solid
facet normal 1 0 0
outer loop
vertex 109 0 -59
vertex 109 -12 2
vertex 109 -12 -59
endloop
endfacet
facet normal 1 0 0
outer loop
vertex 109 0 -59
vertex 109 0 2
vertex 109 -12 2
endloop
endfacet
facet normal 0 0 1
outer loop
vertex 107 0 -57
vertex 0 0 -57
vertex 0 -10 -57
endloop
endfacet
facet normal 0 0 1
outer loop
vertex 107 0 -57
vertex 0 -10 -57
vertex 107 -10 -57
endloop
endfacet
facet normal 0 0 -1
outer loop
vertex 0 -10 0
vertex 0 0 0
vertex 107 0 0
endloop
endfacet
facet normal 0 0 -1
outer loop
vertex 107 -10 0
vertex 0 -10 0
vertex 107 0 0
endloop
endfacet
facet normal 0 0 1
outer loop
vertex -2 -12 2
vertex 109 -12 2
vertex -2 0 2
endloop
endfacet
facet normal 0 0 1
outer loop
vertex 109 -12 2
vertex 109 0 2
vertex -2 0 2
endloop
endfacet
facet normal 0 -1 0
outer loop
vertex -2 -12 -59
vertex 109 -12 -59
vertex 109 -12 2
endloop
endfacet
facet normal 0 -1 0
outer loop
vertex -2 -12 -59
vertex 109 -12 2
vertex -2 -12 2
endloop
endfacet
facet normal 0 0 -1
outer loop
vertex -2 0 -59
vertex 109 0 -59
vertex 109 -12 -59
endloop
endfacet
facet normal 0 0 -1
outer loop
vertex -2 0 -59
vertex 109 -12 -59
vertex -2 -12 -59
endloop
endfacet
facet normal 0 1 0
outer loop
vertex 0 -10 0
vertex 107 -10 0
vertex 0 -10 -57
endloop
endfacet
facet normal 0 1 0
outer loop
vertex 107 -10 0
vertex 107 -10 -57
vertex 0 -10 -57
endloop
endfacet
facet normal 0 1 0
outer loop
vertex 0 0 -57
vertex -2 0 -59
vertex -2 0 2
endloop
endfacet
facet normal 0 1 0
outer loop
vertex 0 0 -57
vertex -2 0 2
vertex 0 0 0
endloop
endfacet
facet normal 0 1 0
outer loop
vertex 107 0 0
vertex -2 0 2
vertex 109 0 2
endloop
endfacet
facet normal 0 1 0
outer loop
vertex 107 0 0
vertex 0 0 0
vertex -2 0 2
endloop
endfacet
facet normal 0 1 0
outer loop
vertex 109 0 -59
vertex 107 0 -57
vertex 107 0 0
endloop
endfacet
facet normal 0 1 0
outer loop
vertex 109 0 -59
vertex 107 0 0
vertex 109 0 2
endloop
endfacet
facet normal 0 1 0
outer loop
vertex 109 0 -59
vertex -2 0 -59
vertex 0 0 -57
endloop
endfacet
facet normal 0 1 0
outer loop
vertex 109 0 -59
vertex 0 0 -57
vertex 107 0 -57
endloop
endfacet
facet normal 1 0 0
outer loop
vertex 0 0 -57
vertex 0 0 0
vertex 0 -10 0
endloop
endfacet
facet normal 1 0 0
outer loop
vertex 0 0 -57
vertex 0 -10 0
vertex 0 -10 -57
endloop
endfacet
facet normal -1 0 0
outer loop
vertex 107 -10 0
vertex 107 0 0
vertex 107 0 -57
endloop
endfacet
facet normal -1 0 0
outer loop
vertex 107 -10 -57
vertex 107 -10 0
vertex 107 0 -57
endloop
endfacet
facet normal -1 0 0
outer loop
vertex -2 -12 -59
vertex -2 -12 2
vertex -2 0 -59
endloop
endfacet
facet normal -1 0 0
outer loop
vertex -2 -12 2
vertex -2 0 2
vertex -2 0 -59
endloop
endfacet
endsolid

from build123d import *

# Parameters (mm, degrees)
SKETCH_1_W        = 111
SKETCH_1_H        = 61
SKETCH_1_W_2      = 107
SKETCH_1_H_2      = 57
EXTRUDE_1_DEPTH   = 10
SKETCH_3_W        = 111
SKETCH_3_H        = 61
EXTRUDE_1_2_DEPTH = 2


with BuildPart() as part:
    # 草圖1 → Extrude 1 (new body)
    with BuildSketch(Plane(origin=(0, 0, 0), x_dir=(1, 0, 0), z_dir=(0, 1, 0))):
        with Locations((53.5, 28.5)):
            Rectangle(SKETCH_1_W, SKETCH_1_H)
        with Locations((53.5, 28.5)):
            Rectangle(SKETCH_1_W_2, SKETCH_1_H_2, mode=Mode.SUBTRACT)
    extrude(amount=-EXTRUDE_1_DEPTH)

    # 草圖3 → Extrude 1 2 (add)
    with BuildSketch(Plane(origin=(0, -10, 0), x_dir=(-1, 0, 0), z_dir=(0, -1, 0))):
        with Locations((-53.5, 28.5)):
            Rectangle(SKETCH_3_W, SKETCH_3_H)
    extrude(amount=EXTRUDE_1_2_DEPTH)


solid = part.part
